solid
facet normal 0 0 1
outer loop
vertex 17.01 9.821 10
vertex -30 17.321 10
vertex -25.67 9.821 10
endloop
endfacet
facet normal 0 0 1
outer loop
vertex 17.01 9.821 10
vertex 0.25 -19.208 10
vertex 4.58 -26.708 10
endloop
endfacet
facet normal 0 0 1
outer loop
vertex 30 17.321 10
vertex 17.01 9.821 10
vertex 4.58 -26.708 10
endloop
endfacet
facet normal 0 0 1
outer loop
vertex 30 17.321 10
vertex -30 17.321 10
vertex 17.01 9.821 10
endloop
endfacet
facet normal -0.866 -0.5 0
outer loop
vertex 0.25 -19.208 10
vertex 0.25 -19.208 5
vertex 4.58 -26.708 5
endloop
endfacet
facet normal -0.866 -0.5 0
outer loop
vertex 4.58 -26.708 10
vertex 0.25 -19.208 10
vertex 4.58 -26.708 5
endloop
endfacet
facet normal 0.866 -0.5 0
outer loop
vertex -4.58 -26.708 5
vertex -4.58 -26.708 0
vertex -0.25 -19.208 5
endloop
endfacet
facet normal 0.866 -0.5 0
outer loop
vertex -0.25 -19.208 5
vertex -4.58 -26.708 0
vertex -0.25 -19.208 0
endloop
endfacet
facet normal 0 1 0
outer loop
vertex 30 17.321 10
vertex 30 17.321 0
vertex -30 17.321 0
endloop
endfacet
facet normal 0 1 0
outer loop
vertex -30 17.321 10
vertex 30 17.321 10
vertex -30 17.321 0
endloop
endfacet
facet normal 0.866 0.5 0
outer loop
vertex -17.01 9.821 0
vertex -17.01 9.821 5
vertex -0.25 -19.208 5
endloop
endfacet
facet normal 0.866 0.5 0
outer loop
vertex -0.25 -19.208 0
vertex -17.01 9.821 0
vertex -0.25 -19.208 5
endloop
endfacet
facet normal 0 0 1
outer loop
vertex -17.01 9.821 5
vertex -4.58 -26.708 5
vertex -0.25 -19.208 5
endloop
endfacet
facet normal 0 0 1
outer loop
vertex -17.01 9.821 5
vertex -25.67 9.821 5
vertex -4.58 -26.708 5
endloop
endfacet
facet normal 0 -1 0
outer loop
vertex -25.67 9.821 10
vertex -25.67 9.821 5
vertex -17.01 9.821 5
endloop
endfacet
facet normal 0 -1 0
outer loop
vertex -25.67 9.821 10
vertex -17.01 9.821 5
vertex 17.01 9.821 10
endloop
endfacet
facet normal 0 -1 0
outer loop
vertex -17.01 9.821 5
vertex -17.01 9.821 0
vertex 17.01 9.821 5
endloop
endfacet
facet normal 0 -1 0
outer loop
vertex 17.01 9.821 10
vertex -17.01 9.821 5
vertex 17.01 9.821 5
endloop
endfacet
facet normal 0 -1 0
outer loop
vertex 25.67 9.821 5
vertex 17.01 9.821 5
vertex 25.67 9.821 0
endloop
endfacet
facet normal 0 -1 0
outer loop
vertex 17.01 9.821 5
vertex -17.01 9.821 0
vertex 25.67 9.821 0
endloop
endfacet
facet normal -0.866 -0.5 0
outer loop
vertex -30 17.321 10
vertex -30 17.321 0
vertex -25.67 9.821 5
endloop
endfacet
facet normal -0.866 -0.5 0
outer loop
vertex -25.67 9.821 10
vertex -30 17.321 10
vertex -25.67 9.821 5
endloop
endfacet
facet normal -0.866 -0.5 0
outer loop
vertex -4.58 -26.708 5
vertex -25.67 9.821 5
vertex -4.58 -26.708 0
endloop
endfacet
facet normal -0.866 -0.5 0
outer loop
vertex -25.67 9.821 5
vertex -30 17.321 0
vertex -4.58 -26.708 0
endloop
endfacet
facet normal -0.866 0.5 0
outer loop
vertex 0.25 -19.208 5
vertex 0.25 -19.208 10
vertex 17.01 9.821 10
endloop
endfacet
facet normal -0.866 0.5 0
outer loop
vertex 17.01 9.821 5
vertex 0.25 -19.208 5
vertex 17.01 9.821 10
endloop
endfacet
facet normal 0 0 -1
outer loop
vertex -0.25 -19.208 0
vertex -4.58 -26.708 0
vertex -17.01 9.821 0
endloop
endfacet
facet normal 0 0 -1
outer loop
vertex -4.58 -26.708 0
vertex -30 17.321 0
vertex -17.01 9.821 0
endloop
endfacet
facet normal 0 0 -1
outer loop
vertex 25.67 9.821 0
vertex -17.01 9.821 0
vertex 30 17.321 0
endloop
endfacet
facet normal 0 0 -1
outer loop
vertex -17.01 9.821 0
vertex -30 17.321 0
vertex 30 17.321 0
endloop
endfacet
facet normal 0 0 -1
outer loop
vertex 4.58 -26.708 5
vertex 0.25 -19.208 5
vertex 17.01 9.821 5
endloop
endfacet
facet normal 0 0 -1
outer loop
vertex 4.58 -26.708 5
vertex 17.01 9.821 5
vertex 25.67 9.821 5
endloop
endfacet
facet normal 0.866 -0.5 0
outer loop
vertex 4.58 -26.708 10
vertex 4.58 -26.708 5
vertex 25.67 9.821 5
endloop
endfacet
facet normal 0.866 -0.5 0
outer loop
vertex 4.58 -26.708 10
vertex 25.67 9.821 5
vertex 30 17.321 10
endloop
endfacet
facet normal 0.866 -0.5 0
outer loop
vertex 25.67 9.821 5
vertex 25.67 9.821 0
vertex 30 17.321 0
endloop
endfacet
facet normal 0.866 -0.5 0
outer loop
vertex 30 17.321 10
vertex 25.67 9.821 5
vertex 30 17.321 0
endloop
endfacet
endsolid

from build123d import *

# Parameters (mm, degrees)
F1_DEPTH  = 10
F3_DEPTH  = 10.001
F7_DEPTH  = 10.001
F8_DEPTH  = 10.001
F9_DEPTH  = 5
F10_DEPTH = 5


with BuildPart() as f1:
    # F0 (on Top) → F1 (new body)
    with BuildSketch(Plane.XY):
        Polygon((30, 17.320508), (-30, 17.320508), (0, -34.641016), align=None)
    extrude(amount=F1_DEPTH)

    # F2 (on face) → F3 (cut, through all)
    with BuildSketch(Plane.XY.offset(10)):
        Polygon((17.009619, 9.820508), (-17.009619, 9.820508), (0, -19.641016), align=None)
    extrude(amount=-F3_DEPTH, mode=Mode.SUBTRACT)

    # F6 (on face) → F7 (cut, through all)
    with BuildSketch(Plane(origin=(0, 0, 0), x_dir=(1, 0, 0), z_dir=(0, 0, -1))):
        Polygon((4.330127, 27.141016), (0, 34.641016), (0, 19.641016), (0.25, 19.208003), (4.580127, 26.708003), align=None)
        Polygon((0, 19.641016), (0, 34.641016), (-4.330127, 27.141016), (-4.580127, 26.708003), (-0.25, 19.208003), align=None)
        Polygon((0.25, 19.208003), (0, 19.641016), (-0.25, 19.208003), align=None)
    extrude(amount=-F7_DEPTH, mode=Mode.SUBTRACT)

    # F6 (on face) → F8 (cut, through all)
    with BuildSketch(Plane(origin=(0, 0, 0), x_dir=(1, 0, 0), z_dir=(0, 0, -1))):
        Polygon((4.330127, 27.141016), (0, 34.641016), (0, 19.641016), (0.25, 19.208003), (4.580127, 26.708003), align=None)
        Polygon((0, 19.641016), (0, 34.641016), (-4.330127, 27.141016), (-4.580127, 26.708003), (-0.25, 19.208003), align=None)
        Polygon((0.25, 19.208003), (0, 19.641016), (-0.25, 19.208003), align=None)
    extrude(amount=-F8_DEPTH, mode=Mode.SUBTRACT)

    # F5 (on face) → F9 (cut)
    with BuildSketch(Plane.XY.offset(10)):
        Polygon((0, -34.641016), (0, -19.641016), (-17.009619, 9.820508), (-25.669873, 9.820508), align=None)
    extrude(amount=-F9_DEPTH, mode=Mode.SUBTRACT)

    # F4 (on face) → F10 (cut)
    with BuildSketch(Plane(origin=(0, 0, 0), x_dir=(1, 0, 0), z_dir=(0, 0, -1))):
        Polygon((0, 34.641016), (0, 19.641016), (17.009619, -9.820508), (25.669873, -9.820508), align=None)
    extrude(amount=-F10_DEPTH, mode=Mode.SUBTRACT)


solid = f1.part
